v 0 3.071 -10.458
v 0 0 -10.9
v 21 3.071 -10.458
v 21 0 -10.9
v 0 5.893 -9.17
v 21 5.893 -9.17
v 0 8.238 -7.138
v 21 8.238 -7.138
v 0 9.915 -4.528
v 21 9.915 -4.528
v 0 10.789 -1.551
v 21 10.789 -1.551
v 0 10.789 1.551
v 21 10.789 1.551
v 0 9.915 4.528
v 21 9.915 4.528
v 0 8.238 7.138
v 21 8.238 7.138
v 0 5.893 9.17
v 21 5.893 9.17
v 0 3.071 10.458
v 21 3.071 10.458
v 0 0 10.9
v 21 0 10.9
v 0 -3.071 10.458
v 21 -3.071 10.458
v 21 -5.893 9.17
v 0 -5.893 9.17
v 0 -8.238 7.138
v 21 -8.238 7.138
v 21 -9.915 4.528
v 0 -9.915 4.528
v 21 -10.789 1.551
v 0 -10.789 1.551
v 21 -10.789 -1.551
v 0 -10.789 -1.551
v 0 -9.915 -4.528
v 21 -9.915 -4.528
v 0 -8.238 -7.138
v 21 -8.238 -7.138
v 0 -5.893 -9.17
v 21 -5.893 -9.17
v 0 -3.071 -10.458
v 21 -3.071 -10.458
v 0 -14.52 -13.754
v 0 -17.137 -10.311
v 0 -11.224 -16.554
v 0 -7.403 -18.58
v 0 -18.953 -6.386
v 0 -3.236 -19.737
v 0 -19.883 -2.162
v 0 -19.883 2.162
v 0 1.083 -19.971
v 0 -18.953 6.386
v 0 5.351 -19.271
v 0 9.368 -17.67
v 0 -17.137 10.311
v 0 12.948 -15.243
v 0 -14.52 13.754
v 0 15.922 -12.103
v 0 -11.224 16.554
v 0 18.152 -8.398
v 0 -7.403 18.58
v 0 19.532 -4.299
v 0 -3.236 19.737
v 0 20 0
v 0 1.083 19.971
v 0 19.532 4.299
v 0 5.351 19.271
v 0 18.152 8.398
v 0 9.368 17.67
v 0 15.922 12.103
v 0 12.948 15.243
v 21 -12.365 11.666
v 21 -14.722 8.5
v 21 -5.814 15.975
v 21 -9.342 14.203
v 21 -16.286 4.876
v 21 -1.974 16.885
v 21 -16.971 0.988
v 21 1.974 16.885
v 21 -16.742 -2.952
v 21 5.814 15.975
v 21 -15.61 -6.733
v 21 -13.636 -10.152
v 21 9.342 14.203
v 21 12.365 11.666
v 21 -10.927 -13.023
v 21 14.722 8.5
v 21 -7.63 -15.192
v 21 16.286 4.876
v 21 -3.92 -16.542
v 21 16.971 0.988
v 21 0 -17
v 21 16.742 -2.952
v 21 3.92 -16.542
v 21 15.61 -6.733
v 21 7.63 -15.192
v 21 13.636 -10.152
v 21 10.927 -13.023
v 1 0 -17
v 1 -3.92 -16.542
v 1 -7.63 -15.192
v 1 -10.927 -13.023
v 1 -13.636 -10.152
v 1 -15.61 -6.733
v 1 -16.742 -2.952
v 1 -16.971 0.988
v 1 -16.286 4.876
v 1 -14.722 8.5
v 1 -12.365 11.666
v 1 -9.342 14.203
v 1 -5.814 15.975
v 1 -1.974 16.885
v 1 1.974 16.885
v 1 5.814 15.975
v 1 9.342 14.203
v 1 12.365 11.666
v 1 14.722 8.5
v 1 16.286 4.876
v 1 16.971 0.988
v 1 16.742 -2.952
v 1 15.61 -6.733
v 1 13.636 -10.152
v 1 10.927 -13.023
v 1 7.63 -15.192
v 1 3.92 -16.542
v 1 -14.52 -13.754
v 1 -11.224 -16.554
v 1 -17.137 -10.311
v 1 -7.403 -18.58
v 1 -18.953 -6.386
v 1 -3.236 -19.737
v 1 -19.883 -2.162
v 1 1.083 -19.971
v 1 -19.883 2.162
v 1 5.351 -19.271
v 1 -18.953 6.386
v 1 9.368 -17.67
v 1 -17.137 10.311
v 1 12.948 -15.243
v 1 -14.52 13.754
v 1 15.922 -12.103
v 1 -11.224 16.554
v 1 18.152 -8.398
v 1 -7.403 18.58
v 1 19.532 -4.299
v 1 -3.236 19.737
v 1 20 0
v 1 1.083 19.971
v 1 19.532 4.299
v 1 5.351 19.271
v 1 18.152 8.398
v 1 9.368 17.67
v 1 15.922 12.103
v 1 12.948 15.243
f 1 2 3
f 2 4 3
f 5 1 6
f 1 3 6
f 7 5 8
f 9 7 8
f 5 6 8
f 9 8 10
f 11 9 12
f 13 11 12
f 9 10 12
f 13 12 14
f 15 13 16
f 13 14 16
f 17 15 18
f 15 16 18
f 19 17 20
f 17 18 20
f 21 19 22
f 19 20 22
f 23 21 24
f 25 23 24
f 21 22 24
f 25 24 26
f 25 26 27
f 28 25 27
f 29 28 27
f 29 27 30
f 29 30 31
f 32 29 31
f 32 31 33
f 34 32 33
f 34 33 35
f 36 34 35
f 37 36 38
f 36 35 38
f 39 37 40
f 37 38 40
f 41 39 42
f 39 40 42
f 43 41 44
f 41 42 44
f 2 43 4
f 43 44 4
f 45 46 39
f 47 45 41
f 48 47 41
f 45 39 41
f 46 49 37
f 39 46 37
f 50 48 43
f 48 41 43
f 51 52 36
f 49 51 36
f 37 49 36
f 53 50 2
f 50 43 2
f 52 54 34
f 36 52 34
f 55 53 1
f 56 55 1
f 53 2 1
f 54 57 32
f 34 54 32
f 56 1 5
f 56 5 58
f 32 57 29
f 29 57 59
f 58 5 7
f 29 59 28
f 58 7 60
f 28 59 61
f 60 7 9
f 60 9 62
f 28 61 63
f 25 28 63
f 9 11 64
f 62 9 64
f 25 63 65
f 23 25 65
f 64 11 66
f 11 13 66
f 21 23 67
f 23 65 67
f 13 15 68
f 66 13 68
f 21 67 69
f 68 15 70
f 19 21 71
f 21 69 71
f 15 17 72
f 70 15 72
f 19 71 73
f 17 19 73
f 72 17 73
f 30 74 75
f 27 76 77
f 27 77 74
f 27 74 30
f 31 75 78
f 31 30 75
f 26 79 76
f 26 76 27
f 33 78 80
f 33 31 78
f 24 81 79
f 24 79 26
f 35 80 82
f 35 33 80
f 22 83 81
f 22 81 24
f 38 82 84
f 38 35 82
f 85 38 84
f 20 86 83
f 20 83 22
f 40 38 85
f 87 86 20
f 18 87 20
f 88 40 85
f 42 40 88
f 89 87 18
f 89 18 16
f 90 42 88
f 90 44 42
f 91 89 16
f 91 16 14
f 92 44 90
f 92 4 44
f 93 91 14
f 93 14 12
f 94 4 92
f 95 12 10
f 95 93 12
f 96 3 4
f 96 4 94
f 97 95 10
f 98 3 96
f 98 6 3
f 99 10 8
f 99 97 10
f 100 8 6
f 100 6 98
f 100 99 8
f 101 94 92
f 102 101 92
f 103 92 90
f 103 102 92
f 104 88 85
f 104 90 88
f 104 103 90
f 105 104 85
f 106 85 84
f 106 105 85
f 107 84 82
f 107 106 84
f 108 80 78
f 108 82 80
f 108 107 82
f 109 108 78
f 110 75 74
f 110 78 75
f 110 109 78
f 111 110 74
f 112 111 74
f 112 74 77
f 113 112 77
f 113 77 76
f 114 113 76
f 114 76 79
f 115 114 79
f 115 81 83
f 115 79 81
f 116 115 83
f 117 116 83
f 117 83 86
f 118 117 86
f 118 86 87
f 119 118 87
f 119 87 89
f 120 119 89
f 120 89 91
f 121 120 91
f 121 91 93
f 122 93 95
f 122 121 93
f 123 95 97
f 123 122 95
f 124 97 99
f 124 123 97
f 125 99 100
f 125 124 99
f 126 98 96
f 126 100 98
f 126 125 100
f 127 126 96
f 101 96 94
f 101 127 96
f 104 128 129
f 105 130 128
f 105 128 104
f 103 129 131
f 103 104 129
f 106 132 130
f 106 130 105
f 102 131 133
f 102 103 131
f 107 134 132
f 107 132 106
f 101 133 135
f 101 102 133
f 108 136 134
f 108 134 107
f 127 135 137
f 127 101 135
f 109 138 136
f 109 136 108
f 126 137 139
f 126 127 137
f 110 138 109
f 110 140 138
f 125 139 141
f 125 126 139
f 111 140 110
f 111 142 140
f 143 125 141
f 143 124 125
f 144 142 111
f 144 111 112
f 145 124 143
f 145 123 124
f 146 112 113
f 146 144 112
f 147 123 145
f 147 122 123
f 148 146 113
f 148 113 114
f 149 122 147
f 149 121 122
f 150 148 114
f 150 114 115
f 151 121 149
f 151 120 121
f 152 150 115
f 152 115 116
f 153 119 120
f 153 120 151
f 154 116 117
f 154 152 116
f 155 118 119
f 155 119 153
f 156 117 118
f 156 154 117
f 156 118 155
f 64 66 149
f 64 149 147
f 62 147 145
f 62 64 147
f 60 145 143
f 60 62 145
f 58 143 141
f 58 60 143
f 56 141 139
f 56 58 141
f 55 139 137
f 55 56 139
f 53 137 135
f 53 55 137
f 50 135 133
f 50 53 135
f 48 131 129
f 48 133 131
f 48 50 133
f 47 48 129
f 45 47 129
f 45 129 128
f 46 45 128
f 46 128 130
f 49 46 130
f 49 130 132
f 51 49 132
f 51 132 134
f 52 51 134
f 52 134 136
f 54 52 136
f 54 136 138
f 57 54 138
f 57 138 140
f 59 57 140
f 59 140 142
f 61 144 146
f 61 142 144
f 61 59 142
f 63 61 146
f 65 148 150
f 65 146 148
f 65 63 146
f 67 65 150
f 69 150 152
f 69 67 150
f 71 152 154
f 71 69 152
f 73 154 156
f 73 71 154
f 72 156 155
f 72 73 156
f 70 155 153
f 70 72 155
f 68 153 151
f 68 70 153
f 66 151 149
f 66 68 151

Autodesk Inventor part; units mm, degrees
ref_plane "YZ Plane" through (0, 0, 0) normal (1, 0, 0) x (0, 1, 0)
ref_plane "XZ Plane" through (0, 0, 0) normal (0, 1, 0) x (-1, 0, 0)
ref_plane "XY Plane" through (0, 0, 0) normal (0, 0, 1) x (1, 0, 0)
sketch "Skizze1" plane through (0, 0, 0) normal (1, 0, 0) x (0, 1, 0)
  circle A0 centre (0, 0) radius 20
  dimension "d0" = 40
extrude "Extrusion1" add sketch "Skizze1" along normal blind 1
sketch "Skizze2" plane through (1, 0, 0) normal (1, 0, 0) x (0, 0, -1)
  circle A0 centre (0, 0) radius 20 projected
  circle A1 centre (0, 0) radius 17
  dimension "d3" = 34
extrude "Extrusion2" add sketch "Skizze2" along normal blind 20 contours A1
sketch "Skizze5" plane through (0, 0, 0) normal (-1, 0, 0) x (0, 0, 1)
  circle A0 centre (0, 0) radius 20 projected
  circle A1 centre (0, 0) radius 5
  dimension "d12" = 10
extrude "Extrusion5" add sketch "Skizze5" along normal blind 10 contours A1
sketch "Skizze6" plane through (21, 0, 0) normal (1, 0, 0) x (0, 0, -1)
  circle A0 centre (0, 0) radius 17 projected
  circle A1 centre (0, 0) radius 10.9
  dimension "d15" = 21.8
extrude "Extrusion6" cut sketch "Skizze6" against normal through all contours A1
properties part number "Rolle_schieber21.8 ipt"
